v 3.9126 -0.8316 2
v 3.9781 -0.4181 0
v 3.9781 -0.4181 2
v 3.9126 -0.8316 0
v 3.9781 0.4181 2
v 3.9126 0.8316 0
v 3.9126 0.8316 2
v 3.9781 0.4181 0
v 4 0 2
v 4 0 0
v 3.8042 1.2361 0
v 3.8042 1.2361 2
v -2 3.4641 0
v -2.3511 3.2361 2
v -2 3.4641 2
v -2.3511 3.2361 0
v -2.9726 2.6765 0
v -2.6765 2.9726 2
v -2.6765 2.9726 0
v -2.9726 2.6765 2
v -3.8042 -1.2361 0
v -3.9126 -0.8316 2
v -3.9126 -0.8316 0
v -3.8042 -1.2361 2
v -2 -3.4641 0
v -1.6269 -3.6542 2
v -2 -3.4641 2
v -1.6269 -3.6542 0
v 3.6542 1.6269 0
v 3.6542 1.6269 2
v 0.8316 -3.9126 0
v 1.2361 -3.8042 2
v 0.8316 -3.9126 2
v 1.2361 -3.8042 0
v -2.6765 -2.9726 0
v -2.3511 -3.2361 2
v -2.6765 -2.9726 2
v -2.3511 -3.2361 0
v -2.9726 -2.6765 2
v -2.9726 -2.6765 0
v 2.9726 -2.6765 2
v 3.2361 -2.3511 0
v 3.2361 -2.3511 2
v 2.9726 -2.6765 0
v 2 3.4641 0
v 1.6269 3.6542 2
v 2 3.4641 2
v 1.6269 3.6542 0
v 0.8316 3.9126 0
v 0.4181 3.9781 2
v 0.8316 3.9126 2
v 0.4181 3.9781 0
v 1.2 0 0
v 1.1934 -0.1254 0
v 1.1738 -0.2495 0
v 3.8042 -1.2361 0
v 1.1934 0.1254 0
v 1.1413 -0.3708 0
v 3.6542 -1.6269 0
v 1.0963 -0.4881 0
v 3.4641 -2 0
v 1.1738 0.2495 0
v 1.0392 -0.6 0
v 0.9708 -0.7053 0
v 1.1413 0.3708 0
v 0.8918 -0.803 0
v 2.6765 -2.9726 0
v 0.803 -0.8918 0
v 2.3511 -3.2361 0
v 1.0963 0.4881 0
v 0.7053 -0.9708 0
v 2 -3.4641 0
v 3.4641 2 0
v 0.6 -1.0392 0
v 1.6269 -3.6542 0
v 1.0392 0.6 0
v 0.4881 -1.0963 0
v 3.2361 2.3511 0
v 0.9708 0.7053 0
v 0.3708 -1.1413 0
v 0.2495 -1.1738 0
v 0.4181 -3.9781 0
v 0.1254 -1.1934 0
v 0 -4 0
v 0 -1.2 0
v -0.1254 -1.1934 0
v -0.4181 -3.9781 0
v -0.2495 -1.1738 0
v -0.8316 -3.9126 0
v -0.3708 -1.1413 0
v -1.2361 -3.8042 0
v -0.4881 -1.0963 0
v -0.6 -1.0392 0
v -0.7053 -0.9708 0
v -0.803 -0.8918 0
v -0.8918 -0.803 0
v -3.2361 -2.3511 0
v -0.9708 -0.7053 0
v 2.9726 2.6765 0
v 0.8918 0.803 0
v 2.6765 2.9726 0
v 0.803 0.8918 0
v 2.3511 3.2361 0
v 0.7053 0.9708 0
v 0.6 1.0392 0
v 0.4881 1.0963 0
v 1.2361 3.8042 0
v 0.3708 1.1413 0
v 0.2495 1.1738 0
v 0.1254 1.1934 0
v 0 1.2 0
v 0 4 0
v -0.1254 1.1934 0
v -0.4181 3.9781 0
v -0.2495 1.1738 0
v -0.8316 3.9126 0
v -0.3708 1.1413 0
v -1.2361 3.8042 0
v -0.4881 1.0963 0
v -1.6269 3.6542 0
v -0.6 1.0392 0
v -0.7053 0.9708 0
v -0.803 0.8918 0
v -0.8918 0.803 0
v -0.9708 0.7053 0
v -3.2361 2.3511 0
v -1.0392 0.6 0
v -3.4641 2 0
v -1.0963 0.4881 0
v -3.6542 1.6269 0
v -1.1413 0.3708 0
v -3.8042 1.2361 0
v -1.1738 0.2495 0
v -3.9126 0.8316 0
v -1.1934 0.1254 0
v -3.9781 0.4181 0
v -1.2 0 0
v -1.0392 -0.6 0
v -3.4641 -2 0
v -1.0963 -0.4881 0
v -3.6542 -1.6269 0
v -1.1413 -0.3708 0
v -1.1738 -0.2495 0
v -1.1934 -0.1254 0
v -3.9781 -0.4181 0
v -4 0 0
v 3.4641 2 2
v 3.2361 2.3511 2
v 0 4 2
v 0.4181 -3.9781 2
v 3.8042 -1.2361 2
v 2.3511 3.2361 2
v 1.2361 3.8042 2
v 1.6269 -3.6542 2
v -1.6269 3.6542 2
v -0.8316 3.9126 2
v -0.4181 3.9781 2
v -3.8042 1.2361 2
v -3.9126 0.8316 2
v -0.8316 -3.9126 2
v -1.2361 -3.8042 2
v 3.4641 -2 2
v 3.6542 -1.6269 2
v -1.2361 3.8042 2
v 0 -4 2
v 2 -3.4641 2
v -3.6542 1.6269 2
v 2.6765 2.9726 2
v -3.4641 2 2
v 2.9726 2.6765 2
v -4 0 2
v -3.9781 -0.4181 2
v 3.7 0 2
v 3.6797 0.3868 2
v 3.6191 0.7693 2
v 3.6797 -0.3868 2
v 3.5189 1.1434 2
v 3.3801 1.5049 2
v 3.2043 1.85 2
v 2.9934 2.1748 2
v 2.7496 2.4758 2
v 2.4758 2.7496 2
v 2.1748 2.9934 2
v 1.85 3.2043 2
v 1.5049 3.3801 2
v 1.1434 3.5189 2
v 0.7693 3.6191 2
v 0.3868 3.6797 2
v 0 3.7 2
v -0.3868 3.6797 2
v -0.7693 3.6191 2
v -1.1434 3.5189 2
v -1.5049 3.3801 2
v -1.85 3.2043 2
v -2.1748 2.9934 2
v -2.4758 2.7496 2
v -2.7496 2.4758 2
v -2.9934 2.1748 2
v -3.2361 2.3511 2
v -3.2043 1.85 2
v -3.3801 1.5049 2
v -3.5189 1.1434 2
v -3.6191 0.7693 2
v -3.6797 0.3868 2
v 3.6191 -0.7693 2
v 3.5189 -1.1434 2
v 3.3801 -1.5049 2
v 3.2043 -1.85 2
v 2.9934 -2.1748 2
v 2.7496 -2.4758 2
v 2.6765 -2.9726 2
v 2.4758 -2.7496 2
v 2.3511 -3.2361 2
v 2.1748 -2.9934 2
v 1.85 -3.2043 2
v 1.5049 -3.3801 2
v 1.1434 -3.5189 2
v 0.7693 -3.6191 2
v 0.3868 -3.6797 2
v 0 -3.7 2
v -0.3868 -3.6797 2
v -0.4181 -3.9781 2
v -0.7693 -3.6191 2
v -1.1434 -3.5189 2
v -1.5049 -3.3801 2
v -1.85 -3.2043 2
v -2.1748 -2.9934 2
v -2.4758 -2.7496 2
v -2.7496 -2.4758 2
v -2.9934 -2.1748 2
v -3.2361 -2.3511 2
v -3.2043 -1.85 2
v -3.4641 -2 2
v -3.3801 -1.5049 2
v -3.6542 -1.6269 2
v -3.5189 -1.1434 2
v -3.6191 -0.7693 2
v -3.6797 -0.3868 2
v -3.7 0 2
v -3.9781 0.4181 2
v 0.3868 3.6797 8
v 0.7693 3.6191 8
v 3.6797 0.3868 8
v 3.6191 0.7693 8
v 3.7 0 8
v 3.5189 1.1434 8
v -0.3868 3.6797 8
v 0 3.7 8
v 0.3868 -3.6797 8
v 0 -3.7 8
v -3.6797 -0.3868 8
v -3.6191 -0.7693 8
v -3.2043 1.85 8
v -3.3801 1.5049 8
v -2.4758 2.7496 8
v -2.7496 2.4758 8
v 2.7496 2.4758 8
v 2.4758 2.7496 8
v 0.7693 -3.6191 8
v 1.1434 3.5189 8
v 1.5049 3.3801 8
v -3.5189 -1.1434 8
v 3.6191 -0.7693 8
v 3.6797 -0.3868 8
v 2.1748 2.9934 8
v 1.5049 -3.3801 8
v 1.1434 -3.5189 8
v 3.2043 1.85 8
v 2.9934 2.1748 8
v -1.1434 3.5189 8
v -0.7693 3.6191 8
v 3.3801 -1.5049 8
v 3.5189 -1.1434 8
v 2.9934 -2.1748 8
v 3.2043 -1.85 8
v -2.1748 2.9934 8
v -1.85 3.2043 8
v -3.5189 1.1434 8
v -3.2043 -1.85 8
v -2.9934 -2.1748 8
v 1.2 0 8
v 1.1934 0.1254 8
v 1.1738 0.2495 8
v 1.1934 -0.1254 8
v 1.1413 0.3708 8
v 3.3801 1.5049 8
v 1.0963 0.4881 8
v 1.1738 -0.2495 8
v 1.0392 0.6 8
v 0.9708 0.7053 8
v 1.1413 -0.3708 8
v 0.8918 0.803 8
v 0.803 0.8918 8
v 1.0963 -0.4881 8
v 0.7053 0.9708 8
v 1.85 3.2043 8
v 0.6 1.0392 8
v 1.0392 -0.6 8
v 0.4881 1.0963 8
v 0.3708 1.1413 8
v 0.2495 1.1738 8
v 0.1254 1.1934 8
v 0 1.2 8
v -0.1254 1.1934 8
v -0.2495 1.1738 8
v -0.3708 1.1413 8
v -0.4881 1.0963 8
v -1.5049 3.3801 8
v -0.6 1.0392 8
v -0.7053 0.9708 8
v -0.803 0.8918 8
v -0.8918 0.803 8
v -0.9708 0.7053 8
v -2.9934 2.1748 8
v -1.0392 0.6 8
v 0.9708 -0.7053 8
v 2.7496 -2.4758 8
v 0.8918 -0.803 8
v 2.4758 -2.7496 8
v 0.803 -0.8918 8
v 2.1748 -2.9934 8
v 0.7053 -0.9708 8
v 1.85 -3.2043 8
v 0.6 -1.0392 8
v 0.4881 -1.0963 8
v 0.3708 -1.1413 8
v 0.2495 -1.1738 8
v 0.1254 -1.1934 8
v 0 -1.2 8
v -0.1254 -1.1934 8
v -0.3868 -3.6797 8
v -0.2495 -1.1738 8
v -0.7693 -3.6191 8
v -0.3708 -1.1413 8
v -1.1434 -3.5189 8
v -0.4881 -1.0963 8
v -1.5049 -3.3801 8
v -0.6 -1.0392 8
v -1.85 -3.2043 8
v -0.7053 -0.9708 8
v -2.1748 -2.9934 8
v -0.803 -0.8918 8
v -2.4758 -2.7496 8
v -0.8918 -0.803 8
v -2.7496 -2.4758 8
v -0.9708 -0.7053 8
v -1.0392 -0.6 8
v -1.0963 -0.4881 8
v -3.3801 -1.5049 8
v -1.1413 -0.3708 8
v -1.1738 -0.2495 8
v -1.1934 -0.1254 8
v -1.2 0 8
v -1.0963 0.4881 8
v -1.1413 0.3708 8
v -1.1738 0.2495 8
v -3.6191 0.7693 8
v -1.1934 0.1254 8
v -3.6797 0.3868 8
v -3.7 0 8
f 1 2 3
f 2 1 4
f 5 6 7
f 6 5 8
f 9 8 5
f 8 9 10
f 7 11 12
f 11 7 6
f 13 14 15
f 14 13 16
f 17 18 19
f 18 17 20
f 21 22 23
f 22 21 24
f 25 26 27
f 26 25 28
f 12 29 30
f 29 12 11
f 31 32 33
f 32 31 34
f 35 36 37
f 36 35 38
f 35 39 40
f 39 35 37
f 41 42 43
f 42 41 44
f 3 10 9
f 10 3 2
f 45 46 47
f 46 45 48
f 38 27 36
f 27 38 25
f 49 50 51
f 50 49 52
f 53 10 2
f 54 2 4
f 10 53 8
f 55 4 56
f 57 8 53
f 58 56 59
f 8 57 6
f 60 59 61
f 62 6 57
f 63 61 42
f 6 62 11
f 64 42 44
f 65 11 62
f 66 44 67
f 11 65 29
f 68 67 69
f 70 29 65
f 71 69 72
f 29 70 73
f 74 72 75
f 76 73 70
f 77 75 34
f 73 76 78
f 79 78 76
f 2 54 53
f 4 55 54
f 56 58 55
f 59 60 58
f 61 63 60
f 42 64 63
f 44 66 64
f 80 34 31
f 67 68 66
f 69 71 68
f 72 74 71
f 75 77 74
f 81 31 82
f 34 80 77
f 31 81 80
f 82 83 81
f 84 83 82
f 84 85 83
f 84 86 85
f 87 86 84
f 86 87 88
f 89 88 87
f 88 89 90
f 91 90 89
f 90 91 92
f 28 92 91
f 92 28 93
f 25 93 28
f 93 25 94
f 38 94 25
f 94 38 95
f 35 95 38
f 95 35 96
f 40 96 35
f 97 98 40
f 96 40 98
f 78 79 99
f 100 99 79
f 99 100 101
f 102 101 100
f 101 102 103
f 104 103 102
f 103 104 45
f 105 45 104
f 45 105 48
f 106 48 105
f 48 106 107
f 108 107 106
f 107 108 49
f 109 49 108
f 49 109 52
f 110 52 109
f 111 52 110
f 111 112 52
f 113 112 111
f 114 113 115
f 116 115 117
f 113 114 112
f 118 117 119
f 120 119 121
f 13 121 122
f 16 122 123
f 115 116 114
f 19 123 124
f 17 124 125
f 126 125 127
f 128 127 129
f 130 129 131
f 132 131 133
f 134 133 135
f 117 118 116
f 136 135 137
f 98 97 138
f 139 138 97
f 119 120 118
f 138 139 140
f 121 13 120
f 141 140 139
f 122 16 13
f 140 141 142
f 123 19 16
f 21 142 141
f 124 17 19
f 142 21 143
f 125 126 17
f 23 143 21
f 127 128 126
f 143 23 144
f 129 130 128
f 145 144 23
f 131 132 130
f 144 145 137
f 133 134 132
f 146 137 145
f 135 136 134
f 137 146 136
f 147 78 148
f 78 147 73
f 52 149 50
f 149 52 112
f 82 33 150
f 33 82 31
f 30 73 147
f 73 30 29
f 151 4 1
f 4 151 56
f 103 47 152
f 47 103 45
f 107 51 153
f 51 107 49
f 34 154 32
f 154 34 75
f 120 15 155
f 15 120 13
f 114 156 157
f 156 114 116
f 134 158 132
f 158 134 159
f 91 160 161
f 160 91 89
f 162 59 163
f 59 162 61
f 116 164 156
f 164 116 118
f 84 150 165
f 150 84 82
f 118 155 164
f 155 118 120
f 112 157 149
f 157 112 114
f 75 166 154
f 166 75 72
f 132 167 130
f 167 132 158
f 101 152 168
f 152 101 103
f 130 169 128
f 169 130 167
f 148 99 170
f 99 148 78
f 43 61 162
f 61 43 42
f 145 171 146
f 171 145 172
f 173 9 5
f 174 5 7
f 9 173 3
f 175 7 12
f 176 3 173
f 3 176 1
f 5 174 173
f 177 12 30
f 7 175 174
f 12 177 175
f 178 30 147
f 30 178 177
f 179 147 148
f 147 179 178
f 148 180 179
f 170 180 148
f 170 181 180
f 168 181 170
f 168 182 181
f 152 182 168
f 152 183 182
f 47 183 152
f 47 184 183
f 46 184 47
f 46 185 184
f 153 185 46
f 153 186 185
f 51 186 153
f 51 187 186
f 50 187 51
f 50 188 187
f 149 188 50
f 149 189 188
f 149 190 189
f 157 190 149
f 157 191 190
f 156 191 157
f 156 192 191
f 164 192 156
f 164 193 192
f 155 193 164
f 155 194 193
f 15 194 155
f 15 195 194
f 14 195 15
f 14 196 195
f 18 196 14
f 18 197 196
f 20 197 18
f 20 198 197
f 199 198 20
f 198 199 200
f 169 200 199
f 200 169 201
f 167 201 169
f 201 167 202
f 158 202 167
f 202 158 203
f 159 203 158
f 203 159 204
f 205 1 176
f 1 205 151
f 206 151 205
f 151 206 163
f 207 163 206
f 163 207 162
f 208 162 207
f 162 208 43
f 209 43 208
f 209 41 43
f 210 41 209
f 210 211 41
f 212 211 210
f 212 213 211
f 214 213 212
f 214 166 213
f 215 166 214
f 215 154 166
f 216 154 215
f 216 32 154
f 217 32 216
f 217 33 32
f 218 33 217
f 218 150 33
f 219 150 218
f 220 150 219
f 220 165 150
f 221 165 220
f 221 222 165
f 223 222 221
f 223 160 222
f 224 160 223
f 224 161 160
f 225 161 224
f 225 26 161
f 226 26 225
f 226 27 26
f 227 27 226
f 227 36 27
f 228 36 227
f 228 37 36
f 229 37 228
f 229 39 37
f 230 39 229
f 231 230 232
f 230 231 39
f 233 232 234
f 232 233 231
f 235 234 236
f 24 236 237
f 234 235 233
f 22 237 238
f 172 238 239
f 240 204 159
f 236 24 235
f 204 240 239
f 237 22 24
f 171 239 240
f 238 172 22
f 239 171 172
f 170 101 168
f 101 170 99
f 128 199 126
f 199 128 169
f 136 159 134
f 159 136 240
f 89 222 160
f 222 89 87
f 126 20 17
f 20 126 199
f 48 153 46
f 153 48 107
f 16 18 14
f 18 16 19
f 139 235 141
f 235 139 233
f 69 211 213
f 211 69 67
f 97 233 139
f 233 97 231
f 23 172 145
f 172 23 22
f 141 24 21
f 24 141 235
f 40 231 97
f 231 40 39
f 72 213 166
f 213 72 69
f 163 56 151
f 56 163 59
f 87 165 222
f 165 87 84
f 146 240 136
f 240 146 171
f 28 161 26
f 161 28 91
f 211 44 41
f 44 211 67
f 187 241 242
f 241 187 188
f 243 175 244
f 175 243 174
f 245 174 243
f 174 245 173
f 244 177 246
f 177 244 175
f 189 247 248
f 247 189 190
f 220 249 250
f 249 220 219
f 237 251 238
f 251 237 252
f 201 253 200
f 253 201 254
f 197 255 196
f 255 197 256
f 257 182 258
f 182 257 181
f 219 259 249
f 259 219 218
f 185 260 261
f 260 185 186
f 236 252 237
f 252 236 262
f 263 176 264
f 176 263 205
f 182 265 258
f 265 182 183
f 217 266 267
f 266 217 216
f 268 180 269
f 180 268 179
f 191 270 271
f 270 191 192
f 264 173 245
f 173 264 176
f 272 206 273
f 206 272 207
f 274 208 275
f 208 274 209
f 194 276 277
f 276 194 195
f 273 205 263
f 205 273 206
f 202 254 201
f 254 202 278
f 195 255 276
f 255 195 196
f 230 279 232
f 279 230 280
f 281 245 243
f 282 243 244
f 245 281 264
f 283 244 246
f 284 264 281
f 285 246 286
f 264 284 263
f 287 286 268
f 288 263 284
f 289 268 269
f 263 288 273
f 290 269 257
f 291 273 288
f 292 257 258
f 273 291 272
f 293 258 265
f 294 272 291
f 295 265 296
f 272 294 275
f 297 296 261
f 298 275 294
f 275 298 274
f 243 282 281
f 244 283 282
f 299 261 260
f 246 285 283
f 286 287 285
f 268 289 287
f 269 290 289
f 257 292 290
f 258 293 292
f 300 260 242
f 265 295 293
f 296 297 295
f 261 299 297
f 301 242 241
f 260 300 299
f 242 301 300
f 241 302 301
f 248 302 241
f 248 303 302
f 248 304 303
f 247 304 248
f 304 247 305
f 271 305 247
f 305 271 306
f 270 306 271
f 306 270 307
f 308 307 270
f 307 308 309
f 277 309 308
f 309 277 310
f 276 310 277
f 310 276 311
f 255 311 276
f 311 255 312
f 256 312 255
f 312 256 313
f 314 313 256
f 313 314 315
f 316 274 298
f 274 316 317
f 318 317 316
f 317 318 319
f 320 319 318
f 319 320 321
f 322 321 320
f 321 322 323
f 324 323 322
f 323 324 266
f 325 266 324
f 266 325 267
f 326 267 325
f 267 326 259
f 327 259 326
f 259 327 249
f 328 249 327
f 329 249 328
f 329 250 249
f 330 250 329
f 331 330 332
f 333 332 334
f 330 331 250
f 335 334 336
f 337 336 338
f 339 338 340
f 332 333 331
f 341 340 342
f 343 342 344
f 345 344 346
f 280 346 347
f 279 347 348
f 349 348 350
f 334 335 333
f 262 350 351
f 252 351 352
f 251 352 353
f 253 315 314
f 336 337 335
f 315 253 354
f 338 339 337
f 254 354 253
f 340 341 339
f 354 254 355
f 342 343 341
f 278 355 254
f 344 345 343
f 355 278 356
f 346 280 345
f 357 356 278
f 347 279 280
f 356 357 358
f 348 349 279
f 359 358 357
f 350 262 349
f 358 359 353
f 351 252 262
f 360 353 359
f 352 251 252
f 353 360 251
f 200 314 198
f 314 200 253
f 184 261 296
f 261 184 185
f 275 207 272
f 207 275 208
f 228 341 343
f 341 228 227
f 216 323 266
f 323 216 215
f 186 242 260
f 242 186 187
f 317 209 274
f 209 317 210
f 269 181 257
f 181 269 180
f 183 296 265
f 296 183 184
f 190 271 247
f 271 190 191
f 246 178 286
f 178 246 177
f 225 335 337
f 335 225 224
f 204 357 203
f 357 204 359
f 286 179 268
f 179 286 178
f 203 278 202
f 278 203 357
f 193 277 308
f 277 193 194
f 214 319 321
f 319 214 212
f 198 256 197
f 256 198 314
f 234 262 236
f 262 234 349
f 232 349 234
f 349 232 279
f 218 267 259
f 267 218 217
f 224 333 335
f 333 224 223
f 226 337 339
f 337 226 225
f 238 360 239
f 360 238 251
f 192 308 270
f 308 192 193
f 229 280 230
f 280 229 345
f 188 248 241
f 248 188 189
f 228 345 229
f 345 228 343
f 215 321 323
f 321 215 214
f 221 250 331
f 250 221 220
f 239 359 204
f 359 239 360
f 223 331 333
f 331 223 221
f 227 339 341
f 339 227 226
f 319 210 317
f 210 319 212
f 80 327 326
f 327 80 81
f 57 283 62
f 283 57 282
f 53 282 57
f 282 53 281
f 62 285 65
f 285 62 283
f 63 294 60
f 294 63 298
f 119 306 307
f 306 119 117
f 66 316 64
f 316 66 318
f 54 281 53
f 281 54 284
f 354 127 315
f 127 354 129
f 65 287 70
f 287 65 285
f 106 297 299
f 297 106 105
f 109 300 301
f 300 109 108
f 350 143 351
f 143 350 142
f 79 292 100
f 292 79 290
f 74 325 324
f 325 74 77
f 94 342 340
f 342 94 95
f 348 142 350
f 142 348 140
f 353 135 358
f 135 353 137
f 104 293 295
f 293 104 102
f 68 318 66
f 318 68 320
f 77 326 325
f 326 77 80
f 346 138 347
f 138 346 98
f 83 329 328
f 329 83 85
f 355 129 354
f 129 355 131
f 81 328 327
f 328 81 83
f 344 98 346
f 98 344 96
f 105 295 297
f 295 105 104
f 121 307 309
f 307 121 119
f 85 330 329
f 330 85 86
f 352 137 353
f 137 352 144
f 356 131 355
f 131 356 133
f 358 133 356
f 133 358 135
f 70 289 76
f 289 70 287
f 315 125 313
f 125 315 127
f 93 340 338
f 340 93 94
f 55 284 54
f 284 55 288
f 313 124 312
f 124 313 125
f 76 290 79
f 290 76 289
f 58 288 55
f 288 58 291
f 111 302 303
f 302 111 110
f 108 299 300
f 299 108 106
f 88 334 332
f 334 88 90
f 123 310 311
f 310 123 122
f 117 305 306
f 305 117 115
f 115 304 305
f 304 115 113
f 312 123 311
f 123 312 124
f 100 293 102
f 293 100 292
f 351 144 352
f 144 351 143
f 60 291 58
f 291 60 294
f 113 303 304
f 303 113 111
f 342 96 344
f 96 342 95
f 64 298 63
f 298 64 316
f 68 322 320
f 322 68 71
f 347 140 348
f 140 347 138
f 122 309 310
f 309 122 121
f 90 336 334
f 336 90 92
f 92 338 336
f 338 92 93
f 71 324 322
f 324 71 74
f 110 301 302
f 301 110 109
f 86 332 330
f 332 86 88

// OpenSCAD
// PCB standoff with mounting base.
$fn = 60;
eps = 0.02;
thread_d = 2.4;
base_d = 8;
height = 8;
body_d = thread_d+5;
difference() {
    union() { cylinder(d=base_d,h=2); cylinder(d=body_d,h=height); }
    translate([0,0,-eps]) cylinder(d=thread_d,h=height+2*eps);
}
